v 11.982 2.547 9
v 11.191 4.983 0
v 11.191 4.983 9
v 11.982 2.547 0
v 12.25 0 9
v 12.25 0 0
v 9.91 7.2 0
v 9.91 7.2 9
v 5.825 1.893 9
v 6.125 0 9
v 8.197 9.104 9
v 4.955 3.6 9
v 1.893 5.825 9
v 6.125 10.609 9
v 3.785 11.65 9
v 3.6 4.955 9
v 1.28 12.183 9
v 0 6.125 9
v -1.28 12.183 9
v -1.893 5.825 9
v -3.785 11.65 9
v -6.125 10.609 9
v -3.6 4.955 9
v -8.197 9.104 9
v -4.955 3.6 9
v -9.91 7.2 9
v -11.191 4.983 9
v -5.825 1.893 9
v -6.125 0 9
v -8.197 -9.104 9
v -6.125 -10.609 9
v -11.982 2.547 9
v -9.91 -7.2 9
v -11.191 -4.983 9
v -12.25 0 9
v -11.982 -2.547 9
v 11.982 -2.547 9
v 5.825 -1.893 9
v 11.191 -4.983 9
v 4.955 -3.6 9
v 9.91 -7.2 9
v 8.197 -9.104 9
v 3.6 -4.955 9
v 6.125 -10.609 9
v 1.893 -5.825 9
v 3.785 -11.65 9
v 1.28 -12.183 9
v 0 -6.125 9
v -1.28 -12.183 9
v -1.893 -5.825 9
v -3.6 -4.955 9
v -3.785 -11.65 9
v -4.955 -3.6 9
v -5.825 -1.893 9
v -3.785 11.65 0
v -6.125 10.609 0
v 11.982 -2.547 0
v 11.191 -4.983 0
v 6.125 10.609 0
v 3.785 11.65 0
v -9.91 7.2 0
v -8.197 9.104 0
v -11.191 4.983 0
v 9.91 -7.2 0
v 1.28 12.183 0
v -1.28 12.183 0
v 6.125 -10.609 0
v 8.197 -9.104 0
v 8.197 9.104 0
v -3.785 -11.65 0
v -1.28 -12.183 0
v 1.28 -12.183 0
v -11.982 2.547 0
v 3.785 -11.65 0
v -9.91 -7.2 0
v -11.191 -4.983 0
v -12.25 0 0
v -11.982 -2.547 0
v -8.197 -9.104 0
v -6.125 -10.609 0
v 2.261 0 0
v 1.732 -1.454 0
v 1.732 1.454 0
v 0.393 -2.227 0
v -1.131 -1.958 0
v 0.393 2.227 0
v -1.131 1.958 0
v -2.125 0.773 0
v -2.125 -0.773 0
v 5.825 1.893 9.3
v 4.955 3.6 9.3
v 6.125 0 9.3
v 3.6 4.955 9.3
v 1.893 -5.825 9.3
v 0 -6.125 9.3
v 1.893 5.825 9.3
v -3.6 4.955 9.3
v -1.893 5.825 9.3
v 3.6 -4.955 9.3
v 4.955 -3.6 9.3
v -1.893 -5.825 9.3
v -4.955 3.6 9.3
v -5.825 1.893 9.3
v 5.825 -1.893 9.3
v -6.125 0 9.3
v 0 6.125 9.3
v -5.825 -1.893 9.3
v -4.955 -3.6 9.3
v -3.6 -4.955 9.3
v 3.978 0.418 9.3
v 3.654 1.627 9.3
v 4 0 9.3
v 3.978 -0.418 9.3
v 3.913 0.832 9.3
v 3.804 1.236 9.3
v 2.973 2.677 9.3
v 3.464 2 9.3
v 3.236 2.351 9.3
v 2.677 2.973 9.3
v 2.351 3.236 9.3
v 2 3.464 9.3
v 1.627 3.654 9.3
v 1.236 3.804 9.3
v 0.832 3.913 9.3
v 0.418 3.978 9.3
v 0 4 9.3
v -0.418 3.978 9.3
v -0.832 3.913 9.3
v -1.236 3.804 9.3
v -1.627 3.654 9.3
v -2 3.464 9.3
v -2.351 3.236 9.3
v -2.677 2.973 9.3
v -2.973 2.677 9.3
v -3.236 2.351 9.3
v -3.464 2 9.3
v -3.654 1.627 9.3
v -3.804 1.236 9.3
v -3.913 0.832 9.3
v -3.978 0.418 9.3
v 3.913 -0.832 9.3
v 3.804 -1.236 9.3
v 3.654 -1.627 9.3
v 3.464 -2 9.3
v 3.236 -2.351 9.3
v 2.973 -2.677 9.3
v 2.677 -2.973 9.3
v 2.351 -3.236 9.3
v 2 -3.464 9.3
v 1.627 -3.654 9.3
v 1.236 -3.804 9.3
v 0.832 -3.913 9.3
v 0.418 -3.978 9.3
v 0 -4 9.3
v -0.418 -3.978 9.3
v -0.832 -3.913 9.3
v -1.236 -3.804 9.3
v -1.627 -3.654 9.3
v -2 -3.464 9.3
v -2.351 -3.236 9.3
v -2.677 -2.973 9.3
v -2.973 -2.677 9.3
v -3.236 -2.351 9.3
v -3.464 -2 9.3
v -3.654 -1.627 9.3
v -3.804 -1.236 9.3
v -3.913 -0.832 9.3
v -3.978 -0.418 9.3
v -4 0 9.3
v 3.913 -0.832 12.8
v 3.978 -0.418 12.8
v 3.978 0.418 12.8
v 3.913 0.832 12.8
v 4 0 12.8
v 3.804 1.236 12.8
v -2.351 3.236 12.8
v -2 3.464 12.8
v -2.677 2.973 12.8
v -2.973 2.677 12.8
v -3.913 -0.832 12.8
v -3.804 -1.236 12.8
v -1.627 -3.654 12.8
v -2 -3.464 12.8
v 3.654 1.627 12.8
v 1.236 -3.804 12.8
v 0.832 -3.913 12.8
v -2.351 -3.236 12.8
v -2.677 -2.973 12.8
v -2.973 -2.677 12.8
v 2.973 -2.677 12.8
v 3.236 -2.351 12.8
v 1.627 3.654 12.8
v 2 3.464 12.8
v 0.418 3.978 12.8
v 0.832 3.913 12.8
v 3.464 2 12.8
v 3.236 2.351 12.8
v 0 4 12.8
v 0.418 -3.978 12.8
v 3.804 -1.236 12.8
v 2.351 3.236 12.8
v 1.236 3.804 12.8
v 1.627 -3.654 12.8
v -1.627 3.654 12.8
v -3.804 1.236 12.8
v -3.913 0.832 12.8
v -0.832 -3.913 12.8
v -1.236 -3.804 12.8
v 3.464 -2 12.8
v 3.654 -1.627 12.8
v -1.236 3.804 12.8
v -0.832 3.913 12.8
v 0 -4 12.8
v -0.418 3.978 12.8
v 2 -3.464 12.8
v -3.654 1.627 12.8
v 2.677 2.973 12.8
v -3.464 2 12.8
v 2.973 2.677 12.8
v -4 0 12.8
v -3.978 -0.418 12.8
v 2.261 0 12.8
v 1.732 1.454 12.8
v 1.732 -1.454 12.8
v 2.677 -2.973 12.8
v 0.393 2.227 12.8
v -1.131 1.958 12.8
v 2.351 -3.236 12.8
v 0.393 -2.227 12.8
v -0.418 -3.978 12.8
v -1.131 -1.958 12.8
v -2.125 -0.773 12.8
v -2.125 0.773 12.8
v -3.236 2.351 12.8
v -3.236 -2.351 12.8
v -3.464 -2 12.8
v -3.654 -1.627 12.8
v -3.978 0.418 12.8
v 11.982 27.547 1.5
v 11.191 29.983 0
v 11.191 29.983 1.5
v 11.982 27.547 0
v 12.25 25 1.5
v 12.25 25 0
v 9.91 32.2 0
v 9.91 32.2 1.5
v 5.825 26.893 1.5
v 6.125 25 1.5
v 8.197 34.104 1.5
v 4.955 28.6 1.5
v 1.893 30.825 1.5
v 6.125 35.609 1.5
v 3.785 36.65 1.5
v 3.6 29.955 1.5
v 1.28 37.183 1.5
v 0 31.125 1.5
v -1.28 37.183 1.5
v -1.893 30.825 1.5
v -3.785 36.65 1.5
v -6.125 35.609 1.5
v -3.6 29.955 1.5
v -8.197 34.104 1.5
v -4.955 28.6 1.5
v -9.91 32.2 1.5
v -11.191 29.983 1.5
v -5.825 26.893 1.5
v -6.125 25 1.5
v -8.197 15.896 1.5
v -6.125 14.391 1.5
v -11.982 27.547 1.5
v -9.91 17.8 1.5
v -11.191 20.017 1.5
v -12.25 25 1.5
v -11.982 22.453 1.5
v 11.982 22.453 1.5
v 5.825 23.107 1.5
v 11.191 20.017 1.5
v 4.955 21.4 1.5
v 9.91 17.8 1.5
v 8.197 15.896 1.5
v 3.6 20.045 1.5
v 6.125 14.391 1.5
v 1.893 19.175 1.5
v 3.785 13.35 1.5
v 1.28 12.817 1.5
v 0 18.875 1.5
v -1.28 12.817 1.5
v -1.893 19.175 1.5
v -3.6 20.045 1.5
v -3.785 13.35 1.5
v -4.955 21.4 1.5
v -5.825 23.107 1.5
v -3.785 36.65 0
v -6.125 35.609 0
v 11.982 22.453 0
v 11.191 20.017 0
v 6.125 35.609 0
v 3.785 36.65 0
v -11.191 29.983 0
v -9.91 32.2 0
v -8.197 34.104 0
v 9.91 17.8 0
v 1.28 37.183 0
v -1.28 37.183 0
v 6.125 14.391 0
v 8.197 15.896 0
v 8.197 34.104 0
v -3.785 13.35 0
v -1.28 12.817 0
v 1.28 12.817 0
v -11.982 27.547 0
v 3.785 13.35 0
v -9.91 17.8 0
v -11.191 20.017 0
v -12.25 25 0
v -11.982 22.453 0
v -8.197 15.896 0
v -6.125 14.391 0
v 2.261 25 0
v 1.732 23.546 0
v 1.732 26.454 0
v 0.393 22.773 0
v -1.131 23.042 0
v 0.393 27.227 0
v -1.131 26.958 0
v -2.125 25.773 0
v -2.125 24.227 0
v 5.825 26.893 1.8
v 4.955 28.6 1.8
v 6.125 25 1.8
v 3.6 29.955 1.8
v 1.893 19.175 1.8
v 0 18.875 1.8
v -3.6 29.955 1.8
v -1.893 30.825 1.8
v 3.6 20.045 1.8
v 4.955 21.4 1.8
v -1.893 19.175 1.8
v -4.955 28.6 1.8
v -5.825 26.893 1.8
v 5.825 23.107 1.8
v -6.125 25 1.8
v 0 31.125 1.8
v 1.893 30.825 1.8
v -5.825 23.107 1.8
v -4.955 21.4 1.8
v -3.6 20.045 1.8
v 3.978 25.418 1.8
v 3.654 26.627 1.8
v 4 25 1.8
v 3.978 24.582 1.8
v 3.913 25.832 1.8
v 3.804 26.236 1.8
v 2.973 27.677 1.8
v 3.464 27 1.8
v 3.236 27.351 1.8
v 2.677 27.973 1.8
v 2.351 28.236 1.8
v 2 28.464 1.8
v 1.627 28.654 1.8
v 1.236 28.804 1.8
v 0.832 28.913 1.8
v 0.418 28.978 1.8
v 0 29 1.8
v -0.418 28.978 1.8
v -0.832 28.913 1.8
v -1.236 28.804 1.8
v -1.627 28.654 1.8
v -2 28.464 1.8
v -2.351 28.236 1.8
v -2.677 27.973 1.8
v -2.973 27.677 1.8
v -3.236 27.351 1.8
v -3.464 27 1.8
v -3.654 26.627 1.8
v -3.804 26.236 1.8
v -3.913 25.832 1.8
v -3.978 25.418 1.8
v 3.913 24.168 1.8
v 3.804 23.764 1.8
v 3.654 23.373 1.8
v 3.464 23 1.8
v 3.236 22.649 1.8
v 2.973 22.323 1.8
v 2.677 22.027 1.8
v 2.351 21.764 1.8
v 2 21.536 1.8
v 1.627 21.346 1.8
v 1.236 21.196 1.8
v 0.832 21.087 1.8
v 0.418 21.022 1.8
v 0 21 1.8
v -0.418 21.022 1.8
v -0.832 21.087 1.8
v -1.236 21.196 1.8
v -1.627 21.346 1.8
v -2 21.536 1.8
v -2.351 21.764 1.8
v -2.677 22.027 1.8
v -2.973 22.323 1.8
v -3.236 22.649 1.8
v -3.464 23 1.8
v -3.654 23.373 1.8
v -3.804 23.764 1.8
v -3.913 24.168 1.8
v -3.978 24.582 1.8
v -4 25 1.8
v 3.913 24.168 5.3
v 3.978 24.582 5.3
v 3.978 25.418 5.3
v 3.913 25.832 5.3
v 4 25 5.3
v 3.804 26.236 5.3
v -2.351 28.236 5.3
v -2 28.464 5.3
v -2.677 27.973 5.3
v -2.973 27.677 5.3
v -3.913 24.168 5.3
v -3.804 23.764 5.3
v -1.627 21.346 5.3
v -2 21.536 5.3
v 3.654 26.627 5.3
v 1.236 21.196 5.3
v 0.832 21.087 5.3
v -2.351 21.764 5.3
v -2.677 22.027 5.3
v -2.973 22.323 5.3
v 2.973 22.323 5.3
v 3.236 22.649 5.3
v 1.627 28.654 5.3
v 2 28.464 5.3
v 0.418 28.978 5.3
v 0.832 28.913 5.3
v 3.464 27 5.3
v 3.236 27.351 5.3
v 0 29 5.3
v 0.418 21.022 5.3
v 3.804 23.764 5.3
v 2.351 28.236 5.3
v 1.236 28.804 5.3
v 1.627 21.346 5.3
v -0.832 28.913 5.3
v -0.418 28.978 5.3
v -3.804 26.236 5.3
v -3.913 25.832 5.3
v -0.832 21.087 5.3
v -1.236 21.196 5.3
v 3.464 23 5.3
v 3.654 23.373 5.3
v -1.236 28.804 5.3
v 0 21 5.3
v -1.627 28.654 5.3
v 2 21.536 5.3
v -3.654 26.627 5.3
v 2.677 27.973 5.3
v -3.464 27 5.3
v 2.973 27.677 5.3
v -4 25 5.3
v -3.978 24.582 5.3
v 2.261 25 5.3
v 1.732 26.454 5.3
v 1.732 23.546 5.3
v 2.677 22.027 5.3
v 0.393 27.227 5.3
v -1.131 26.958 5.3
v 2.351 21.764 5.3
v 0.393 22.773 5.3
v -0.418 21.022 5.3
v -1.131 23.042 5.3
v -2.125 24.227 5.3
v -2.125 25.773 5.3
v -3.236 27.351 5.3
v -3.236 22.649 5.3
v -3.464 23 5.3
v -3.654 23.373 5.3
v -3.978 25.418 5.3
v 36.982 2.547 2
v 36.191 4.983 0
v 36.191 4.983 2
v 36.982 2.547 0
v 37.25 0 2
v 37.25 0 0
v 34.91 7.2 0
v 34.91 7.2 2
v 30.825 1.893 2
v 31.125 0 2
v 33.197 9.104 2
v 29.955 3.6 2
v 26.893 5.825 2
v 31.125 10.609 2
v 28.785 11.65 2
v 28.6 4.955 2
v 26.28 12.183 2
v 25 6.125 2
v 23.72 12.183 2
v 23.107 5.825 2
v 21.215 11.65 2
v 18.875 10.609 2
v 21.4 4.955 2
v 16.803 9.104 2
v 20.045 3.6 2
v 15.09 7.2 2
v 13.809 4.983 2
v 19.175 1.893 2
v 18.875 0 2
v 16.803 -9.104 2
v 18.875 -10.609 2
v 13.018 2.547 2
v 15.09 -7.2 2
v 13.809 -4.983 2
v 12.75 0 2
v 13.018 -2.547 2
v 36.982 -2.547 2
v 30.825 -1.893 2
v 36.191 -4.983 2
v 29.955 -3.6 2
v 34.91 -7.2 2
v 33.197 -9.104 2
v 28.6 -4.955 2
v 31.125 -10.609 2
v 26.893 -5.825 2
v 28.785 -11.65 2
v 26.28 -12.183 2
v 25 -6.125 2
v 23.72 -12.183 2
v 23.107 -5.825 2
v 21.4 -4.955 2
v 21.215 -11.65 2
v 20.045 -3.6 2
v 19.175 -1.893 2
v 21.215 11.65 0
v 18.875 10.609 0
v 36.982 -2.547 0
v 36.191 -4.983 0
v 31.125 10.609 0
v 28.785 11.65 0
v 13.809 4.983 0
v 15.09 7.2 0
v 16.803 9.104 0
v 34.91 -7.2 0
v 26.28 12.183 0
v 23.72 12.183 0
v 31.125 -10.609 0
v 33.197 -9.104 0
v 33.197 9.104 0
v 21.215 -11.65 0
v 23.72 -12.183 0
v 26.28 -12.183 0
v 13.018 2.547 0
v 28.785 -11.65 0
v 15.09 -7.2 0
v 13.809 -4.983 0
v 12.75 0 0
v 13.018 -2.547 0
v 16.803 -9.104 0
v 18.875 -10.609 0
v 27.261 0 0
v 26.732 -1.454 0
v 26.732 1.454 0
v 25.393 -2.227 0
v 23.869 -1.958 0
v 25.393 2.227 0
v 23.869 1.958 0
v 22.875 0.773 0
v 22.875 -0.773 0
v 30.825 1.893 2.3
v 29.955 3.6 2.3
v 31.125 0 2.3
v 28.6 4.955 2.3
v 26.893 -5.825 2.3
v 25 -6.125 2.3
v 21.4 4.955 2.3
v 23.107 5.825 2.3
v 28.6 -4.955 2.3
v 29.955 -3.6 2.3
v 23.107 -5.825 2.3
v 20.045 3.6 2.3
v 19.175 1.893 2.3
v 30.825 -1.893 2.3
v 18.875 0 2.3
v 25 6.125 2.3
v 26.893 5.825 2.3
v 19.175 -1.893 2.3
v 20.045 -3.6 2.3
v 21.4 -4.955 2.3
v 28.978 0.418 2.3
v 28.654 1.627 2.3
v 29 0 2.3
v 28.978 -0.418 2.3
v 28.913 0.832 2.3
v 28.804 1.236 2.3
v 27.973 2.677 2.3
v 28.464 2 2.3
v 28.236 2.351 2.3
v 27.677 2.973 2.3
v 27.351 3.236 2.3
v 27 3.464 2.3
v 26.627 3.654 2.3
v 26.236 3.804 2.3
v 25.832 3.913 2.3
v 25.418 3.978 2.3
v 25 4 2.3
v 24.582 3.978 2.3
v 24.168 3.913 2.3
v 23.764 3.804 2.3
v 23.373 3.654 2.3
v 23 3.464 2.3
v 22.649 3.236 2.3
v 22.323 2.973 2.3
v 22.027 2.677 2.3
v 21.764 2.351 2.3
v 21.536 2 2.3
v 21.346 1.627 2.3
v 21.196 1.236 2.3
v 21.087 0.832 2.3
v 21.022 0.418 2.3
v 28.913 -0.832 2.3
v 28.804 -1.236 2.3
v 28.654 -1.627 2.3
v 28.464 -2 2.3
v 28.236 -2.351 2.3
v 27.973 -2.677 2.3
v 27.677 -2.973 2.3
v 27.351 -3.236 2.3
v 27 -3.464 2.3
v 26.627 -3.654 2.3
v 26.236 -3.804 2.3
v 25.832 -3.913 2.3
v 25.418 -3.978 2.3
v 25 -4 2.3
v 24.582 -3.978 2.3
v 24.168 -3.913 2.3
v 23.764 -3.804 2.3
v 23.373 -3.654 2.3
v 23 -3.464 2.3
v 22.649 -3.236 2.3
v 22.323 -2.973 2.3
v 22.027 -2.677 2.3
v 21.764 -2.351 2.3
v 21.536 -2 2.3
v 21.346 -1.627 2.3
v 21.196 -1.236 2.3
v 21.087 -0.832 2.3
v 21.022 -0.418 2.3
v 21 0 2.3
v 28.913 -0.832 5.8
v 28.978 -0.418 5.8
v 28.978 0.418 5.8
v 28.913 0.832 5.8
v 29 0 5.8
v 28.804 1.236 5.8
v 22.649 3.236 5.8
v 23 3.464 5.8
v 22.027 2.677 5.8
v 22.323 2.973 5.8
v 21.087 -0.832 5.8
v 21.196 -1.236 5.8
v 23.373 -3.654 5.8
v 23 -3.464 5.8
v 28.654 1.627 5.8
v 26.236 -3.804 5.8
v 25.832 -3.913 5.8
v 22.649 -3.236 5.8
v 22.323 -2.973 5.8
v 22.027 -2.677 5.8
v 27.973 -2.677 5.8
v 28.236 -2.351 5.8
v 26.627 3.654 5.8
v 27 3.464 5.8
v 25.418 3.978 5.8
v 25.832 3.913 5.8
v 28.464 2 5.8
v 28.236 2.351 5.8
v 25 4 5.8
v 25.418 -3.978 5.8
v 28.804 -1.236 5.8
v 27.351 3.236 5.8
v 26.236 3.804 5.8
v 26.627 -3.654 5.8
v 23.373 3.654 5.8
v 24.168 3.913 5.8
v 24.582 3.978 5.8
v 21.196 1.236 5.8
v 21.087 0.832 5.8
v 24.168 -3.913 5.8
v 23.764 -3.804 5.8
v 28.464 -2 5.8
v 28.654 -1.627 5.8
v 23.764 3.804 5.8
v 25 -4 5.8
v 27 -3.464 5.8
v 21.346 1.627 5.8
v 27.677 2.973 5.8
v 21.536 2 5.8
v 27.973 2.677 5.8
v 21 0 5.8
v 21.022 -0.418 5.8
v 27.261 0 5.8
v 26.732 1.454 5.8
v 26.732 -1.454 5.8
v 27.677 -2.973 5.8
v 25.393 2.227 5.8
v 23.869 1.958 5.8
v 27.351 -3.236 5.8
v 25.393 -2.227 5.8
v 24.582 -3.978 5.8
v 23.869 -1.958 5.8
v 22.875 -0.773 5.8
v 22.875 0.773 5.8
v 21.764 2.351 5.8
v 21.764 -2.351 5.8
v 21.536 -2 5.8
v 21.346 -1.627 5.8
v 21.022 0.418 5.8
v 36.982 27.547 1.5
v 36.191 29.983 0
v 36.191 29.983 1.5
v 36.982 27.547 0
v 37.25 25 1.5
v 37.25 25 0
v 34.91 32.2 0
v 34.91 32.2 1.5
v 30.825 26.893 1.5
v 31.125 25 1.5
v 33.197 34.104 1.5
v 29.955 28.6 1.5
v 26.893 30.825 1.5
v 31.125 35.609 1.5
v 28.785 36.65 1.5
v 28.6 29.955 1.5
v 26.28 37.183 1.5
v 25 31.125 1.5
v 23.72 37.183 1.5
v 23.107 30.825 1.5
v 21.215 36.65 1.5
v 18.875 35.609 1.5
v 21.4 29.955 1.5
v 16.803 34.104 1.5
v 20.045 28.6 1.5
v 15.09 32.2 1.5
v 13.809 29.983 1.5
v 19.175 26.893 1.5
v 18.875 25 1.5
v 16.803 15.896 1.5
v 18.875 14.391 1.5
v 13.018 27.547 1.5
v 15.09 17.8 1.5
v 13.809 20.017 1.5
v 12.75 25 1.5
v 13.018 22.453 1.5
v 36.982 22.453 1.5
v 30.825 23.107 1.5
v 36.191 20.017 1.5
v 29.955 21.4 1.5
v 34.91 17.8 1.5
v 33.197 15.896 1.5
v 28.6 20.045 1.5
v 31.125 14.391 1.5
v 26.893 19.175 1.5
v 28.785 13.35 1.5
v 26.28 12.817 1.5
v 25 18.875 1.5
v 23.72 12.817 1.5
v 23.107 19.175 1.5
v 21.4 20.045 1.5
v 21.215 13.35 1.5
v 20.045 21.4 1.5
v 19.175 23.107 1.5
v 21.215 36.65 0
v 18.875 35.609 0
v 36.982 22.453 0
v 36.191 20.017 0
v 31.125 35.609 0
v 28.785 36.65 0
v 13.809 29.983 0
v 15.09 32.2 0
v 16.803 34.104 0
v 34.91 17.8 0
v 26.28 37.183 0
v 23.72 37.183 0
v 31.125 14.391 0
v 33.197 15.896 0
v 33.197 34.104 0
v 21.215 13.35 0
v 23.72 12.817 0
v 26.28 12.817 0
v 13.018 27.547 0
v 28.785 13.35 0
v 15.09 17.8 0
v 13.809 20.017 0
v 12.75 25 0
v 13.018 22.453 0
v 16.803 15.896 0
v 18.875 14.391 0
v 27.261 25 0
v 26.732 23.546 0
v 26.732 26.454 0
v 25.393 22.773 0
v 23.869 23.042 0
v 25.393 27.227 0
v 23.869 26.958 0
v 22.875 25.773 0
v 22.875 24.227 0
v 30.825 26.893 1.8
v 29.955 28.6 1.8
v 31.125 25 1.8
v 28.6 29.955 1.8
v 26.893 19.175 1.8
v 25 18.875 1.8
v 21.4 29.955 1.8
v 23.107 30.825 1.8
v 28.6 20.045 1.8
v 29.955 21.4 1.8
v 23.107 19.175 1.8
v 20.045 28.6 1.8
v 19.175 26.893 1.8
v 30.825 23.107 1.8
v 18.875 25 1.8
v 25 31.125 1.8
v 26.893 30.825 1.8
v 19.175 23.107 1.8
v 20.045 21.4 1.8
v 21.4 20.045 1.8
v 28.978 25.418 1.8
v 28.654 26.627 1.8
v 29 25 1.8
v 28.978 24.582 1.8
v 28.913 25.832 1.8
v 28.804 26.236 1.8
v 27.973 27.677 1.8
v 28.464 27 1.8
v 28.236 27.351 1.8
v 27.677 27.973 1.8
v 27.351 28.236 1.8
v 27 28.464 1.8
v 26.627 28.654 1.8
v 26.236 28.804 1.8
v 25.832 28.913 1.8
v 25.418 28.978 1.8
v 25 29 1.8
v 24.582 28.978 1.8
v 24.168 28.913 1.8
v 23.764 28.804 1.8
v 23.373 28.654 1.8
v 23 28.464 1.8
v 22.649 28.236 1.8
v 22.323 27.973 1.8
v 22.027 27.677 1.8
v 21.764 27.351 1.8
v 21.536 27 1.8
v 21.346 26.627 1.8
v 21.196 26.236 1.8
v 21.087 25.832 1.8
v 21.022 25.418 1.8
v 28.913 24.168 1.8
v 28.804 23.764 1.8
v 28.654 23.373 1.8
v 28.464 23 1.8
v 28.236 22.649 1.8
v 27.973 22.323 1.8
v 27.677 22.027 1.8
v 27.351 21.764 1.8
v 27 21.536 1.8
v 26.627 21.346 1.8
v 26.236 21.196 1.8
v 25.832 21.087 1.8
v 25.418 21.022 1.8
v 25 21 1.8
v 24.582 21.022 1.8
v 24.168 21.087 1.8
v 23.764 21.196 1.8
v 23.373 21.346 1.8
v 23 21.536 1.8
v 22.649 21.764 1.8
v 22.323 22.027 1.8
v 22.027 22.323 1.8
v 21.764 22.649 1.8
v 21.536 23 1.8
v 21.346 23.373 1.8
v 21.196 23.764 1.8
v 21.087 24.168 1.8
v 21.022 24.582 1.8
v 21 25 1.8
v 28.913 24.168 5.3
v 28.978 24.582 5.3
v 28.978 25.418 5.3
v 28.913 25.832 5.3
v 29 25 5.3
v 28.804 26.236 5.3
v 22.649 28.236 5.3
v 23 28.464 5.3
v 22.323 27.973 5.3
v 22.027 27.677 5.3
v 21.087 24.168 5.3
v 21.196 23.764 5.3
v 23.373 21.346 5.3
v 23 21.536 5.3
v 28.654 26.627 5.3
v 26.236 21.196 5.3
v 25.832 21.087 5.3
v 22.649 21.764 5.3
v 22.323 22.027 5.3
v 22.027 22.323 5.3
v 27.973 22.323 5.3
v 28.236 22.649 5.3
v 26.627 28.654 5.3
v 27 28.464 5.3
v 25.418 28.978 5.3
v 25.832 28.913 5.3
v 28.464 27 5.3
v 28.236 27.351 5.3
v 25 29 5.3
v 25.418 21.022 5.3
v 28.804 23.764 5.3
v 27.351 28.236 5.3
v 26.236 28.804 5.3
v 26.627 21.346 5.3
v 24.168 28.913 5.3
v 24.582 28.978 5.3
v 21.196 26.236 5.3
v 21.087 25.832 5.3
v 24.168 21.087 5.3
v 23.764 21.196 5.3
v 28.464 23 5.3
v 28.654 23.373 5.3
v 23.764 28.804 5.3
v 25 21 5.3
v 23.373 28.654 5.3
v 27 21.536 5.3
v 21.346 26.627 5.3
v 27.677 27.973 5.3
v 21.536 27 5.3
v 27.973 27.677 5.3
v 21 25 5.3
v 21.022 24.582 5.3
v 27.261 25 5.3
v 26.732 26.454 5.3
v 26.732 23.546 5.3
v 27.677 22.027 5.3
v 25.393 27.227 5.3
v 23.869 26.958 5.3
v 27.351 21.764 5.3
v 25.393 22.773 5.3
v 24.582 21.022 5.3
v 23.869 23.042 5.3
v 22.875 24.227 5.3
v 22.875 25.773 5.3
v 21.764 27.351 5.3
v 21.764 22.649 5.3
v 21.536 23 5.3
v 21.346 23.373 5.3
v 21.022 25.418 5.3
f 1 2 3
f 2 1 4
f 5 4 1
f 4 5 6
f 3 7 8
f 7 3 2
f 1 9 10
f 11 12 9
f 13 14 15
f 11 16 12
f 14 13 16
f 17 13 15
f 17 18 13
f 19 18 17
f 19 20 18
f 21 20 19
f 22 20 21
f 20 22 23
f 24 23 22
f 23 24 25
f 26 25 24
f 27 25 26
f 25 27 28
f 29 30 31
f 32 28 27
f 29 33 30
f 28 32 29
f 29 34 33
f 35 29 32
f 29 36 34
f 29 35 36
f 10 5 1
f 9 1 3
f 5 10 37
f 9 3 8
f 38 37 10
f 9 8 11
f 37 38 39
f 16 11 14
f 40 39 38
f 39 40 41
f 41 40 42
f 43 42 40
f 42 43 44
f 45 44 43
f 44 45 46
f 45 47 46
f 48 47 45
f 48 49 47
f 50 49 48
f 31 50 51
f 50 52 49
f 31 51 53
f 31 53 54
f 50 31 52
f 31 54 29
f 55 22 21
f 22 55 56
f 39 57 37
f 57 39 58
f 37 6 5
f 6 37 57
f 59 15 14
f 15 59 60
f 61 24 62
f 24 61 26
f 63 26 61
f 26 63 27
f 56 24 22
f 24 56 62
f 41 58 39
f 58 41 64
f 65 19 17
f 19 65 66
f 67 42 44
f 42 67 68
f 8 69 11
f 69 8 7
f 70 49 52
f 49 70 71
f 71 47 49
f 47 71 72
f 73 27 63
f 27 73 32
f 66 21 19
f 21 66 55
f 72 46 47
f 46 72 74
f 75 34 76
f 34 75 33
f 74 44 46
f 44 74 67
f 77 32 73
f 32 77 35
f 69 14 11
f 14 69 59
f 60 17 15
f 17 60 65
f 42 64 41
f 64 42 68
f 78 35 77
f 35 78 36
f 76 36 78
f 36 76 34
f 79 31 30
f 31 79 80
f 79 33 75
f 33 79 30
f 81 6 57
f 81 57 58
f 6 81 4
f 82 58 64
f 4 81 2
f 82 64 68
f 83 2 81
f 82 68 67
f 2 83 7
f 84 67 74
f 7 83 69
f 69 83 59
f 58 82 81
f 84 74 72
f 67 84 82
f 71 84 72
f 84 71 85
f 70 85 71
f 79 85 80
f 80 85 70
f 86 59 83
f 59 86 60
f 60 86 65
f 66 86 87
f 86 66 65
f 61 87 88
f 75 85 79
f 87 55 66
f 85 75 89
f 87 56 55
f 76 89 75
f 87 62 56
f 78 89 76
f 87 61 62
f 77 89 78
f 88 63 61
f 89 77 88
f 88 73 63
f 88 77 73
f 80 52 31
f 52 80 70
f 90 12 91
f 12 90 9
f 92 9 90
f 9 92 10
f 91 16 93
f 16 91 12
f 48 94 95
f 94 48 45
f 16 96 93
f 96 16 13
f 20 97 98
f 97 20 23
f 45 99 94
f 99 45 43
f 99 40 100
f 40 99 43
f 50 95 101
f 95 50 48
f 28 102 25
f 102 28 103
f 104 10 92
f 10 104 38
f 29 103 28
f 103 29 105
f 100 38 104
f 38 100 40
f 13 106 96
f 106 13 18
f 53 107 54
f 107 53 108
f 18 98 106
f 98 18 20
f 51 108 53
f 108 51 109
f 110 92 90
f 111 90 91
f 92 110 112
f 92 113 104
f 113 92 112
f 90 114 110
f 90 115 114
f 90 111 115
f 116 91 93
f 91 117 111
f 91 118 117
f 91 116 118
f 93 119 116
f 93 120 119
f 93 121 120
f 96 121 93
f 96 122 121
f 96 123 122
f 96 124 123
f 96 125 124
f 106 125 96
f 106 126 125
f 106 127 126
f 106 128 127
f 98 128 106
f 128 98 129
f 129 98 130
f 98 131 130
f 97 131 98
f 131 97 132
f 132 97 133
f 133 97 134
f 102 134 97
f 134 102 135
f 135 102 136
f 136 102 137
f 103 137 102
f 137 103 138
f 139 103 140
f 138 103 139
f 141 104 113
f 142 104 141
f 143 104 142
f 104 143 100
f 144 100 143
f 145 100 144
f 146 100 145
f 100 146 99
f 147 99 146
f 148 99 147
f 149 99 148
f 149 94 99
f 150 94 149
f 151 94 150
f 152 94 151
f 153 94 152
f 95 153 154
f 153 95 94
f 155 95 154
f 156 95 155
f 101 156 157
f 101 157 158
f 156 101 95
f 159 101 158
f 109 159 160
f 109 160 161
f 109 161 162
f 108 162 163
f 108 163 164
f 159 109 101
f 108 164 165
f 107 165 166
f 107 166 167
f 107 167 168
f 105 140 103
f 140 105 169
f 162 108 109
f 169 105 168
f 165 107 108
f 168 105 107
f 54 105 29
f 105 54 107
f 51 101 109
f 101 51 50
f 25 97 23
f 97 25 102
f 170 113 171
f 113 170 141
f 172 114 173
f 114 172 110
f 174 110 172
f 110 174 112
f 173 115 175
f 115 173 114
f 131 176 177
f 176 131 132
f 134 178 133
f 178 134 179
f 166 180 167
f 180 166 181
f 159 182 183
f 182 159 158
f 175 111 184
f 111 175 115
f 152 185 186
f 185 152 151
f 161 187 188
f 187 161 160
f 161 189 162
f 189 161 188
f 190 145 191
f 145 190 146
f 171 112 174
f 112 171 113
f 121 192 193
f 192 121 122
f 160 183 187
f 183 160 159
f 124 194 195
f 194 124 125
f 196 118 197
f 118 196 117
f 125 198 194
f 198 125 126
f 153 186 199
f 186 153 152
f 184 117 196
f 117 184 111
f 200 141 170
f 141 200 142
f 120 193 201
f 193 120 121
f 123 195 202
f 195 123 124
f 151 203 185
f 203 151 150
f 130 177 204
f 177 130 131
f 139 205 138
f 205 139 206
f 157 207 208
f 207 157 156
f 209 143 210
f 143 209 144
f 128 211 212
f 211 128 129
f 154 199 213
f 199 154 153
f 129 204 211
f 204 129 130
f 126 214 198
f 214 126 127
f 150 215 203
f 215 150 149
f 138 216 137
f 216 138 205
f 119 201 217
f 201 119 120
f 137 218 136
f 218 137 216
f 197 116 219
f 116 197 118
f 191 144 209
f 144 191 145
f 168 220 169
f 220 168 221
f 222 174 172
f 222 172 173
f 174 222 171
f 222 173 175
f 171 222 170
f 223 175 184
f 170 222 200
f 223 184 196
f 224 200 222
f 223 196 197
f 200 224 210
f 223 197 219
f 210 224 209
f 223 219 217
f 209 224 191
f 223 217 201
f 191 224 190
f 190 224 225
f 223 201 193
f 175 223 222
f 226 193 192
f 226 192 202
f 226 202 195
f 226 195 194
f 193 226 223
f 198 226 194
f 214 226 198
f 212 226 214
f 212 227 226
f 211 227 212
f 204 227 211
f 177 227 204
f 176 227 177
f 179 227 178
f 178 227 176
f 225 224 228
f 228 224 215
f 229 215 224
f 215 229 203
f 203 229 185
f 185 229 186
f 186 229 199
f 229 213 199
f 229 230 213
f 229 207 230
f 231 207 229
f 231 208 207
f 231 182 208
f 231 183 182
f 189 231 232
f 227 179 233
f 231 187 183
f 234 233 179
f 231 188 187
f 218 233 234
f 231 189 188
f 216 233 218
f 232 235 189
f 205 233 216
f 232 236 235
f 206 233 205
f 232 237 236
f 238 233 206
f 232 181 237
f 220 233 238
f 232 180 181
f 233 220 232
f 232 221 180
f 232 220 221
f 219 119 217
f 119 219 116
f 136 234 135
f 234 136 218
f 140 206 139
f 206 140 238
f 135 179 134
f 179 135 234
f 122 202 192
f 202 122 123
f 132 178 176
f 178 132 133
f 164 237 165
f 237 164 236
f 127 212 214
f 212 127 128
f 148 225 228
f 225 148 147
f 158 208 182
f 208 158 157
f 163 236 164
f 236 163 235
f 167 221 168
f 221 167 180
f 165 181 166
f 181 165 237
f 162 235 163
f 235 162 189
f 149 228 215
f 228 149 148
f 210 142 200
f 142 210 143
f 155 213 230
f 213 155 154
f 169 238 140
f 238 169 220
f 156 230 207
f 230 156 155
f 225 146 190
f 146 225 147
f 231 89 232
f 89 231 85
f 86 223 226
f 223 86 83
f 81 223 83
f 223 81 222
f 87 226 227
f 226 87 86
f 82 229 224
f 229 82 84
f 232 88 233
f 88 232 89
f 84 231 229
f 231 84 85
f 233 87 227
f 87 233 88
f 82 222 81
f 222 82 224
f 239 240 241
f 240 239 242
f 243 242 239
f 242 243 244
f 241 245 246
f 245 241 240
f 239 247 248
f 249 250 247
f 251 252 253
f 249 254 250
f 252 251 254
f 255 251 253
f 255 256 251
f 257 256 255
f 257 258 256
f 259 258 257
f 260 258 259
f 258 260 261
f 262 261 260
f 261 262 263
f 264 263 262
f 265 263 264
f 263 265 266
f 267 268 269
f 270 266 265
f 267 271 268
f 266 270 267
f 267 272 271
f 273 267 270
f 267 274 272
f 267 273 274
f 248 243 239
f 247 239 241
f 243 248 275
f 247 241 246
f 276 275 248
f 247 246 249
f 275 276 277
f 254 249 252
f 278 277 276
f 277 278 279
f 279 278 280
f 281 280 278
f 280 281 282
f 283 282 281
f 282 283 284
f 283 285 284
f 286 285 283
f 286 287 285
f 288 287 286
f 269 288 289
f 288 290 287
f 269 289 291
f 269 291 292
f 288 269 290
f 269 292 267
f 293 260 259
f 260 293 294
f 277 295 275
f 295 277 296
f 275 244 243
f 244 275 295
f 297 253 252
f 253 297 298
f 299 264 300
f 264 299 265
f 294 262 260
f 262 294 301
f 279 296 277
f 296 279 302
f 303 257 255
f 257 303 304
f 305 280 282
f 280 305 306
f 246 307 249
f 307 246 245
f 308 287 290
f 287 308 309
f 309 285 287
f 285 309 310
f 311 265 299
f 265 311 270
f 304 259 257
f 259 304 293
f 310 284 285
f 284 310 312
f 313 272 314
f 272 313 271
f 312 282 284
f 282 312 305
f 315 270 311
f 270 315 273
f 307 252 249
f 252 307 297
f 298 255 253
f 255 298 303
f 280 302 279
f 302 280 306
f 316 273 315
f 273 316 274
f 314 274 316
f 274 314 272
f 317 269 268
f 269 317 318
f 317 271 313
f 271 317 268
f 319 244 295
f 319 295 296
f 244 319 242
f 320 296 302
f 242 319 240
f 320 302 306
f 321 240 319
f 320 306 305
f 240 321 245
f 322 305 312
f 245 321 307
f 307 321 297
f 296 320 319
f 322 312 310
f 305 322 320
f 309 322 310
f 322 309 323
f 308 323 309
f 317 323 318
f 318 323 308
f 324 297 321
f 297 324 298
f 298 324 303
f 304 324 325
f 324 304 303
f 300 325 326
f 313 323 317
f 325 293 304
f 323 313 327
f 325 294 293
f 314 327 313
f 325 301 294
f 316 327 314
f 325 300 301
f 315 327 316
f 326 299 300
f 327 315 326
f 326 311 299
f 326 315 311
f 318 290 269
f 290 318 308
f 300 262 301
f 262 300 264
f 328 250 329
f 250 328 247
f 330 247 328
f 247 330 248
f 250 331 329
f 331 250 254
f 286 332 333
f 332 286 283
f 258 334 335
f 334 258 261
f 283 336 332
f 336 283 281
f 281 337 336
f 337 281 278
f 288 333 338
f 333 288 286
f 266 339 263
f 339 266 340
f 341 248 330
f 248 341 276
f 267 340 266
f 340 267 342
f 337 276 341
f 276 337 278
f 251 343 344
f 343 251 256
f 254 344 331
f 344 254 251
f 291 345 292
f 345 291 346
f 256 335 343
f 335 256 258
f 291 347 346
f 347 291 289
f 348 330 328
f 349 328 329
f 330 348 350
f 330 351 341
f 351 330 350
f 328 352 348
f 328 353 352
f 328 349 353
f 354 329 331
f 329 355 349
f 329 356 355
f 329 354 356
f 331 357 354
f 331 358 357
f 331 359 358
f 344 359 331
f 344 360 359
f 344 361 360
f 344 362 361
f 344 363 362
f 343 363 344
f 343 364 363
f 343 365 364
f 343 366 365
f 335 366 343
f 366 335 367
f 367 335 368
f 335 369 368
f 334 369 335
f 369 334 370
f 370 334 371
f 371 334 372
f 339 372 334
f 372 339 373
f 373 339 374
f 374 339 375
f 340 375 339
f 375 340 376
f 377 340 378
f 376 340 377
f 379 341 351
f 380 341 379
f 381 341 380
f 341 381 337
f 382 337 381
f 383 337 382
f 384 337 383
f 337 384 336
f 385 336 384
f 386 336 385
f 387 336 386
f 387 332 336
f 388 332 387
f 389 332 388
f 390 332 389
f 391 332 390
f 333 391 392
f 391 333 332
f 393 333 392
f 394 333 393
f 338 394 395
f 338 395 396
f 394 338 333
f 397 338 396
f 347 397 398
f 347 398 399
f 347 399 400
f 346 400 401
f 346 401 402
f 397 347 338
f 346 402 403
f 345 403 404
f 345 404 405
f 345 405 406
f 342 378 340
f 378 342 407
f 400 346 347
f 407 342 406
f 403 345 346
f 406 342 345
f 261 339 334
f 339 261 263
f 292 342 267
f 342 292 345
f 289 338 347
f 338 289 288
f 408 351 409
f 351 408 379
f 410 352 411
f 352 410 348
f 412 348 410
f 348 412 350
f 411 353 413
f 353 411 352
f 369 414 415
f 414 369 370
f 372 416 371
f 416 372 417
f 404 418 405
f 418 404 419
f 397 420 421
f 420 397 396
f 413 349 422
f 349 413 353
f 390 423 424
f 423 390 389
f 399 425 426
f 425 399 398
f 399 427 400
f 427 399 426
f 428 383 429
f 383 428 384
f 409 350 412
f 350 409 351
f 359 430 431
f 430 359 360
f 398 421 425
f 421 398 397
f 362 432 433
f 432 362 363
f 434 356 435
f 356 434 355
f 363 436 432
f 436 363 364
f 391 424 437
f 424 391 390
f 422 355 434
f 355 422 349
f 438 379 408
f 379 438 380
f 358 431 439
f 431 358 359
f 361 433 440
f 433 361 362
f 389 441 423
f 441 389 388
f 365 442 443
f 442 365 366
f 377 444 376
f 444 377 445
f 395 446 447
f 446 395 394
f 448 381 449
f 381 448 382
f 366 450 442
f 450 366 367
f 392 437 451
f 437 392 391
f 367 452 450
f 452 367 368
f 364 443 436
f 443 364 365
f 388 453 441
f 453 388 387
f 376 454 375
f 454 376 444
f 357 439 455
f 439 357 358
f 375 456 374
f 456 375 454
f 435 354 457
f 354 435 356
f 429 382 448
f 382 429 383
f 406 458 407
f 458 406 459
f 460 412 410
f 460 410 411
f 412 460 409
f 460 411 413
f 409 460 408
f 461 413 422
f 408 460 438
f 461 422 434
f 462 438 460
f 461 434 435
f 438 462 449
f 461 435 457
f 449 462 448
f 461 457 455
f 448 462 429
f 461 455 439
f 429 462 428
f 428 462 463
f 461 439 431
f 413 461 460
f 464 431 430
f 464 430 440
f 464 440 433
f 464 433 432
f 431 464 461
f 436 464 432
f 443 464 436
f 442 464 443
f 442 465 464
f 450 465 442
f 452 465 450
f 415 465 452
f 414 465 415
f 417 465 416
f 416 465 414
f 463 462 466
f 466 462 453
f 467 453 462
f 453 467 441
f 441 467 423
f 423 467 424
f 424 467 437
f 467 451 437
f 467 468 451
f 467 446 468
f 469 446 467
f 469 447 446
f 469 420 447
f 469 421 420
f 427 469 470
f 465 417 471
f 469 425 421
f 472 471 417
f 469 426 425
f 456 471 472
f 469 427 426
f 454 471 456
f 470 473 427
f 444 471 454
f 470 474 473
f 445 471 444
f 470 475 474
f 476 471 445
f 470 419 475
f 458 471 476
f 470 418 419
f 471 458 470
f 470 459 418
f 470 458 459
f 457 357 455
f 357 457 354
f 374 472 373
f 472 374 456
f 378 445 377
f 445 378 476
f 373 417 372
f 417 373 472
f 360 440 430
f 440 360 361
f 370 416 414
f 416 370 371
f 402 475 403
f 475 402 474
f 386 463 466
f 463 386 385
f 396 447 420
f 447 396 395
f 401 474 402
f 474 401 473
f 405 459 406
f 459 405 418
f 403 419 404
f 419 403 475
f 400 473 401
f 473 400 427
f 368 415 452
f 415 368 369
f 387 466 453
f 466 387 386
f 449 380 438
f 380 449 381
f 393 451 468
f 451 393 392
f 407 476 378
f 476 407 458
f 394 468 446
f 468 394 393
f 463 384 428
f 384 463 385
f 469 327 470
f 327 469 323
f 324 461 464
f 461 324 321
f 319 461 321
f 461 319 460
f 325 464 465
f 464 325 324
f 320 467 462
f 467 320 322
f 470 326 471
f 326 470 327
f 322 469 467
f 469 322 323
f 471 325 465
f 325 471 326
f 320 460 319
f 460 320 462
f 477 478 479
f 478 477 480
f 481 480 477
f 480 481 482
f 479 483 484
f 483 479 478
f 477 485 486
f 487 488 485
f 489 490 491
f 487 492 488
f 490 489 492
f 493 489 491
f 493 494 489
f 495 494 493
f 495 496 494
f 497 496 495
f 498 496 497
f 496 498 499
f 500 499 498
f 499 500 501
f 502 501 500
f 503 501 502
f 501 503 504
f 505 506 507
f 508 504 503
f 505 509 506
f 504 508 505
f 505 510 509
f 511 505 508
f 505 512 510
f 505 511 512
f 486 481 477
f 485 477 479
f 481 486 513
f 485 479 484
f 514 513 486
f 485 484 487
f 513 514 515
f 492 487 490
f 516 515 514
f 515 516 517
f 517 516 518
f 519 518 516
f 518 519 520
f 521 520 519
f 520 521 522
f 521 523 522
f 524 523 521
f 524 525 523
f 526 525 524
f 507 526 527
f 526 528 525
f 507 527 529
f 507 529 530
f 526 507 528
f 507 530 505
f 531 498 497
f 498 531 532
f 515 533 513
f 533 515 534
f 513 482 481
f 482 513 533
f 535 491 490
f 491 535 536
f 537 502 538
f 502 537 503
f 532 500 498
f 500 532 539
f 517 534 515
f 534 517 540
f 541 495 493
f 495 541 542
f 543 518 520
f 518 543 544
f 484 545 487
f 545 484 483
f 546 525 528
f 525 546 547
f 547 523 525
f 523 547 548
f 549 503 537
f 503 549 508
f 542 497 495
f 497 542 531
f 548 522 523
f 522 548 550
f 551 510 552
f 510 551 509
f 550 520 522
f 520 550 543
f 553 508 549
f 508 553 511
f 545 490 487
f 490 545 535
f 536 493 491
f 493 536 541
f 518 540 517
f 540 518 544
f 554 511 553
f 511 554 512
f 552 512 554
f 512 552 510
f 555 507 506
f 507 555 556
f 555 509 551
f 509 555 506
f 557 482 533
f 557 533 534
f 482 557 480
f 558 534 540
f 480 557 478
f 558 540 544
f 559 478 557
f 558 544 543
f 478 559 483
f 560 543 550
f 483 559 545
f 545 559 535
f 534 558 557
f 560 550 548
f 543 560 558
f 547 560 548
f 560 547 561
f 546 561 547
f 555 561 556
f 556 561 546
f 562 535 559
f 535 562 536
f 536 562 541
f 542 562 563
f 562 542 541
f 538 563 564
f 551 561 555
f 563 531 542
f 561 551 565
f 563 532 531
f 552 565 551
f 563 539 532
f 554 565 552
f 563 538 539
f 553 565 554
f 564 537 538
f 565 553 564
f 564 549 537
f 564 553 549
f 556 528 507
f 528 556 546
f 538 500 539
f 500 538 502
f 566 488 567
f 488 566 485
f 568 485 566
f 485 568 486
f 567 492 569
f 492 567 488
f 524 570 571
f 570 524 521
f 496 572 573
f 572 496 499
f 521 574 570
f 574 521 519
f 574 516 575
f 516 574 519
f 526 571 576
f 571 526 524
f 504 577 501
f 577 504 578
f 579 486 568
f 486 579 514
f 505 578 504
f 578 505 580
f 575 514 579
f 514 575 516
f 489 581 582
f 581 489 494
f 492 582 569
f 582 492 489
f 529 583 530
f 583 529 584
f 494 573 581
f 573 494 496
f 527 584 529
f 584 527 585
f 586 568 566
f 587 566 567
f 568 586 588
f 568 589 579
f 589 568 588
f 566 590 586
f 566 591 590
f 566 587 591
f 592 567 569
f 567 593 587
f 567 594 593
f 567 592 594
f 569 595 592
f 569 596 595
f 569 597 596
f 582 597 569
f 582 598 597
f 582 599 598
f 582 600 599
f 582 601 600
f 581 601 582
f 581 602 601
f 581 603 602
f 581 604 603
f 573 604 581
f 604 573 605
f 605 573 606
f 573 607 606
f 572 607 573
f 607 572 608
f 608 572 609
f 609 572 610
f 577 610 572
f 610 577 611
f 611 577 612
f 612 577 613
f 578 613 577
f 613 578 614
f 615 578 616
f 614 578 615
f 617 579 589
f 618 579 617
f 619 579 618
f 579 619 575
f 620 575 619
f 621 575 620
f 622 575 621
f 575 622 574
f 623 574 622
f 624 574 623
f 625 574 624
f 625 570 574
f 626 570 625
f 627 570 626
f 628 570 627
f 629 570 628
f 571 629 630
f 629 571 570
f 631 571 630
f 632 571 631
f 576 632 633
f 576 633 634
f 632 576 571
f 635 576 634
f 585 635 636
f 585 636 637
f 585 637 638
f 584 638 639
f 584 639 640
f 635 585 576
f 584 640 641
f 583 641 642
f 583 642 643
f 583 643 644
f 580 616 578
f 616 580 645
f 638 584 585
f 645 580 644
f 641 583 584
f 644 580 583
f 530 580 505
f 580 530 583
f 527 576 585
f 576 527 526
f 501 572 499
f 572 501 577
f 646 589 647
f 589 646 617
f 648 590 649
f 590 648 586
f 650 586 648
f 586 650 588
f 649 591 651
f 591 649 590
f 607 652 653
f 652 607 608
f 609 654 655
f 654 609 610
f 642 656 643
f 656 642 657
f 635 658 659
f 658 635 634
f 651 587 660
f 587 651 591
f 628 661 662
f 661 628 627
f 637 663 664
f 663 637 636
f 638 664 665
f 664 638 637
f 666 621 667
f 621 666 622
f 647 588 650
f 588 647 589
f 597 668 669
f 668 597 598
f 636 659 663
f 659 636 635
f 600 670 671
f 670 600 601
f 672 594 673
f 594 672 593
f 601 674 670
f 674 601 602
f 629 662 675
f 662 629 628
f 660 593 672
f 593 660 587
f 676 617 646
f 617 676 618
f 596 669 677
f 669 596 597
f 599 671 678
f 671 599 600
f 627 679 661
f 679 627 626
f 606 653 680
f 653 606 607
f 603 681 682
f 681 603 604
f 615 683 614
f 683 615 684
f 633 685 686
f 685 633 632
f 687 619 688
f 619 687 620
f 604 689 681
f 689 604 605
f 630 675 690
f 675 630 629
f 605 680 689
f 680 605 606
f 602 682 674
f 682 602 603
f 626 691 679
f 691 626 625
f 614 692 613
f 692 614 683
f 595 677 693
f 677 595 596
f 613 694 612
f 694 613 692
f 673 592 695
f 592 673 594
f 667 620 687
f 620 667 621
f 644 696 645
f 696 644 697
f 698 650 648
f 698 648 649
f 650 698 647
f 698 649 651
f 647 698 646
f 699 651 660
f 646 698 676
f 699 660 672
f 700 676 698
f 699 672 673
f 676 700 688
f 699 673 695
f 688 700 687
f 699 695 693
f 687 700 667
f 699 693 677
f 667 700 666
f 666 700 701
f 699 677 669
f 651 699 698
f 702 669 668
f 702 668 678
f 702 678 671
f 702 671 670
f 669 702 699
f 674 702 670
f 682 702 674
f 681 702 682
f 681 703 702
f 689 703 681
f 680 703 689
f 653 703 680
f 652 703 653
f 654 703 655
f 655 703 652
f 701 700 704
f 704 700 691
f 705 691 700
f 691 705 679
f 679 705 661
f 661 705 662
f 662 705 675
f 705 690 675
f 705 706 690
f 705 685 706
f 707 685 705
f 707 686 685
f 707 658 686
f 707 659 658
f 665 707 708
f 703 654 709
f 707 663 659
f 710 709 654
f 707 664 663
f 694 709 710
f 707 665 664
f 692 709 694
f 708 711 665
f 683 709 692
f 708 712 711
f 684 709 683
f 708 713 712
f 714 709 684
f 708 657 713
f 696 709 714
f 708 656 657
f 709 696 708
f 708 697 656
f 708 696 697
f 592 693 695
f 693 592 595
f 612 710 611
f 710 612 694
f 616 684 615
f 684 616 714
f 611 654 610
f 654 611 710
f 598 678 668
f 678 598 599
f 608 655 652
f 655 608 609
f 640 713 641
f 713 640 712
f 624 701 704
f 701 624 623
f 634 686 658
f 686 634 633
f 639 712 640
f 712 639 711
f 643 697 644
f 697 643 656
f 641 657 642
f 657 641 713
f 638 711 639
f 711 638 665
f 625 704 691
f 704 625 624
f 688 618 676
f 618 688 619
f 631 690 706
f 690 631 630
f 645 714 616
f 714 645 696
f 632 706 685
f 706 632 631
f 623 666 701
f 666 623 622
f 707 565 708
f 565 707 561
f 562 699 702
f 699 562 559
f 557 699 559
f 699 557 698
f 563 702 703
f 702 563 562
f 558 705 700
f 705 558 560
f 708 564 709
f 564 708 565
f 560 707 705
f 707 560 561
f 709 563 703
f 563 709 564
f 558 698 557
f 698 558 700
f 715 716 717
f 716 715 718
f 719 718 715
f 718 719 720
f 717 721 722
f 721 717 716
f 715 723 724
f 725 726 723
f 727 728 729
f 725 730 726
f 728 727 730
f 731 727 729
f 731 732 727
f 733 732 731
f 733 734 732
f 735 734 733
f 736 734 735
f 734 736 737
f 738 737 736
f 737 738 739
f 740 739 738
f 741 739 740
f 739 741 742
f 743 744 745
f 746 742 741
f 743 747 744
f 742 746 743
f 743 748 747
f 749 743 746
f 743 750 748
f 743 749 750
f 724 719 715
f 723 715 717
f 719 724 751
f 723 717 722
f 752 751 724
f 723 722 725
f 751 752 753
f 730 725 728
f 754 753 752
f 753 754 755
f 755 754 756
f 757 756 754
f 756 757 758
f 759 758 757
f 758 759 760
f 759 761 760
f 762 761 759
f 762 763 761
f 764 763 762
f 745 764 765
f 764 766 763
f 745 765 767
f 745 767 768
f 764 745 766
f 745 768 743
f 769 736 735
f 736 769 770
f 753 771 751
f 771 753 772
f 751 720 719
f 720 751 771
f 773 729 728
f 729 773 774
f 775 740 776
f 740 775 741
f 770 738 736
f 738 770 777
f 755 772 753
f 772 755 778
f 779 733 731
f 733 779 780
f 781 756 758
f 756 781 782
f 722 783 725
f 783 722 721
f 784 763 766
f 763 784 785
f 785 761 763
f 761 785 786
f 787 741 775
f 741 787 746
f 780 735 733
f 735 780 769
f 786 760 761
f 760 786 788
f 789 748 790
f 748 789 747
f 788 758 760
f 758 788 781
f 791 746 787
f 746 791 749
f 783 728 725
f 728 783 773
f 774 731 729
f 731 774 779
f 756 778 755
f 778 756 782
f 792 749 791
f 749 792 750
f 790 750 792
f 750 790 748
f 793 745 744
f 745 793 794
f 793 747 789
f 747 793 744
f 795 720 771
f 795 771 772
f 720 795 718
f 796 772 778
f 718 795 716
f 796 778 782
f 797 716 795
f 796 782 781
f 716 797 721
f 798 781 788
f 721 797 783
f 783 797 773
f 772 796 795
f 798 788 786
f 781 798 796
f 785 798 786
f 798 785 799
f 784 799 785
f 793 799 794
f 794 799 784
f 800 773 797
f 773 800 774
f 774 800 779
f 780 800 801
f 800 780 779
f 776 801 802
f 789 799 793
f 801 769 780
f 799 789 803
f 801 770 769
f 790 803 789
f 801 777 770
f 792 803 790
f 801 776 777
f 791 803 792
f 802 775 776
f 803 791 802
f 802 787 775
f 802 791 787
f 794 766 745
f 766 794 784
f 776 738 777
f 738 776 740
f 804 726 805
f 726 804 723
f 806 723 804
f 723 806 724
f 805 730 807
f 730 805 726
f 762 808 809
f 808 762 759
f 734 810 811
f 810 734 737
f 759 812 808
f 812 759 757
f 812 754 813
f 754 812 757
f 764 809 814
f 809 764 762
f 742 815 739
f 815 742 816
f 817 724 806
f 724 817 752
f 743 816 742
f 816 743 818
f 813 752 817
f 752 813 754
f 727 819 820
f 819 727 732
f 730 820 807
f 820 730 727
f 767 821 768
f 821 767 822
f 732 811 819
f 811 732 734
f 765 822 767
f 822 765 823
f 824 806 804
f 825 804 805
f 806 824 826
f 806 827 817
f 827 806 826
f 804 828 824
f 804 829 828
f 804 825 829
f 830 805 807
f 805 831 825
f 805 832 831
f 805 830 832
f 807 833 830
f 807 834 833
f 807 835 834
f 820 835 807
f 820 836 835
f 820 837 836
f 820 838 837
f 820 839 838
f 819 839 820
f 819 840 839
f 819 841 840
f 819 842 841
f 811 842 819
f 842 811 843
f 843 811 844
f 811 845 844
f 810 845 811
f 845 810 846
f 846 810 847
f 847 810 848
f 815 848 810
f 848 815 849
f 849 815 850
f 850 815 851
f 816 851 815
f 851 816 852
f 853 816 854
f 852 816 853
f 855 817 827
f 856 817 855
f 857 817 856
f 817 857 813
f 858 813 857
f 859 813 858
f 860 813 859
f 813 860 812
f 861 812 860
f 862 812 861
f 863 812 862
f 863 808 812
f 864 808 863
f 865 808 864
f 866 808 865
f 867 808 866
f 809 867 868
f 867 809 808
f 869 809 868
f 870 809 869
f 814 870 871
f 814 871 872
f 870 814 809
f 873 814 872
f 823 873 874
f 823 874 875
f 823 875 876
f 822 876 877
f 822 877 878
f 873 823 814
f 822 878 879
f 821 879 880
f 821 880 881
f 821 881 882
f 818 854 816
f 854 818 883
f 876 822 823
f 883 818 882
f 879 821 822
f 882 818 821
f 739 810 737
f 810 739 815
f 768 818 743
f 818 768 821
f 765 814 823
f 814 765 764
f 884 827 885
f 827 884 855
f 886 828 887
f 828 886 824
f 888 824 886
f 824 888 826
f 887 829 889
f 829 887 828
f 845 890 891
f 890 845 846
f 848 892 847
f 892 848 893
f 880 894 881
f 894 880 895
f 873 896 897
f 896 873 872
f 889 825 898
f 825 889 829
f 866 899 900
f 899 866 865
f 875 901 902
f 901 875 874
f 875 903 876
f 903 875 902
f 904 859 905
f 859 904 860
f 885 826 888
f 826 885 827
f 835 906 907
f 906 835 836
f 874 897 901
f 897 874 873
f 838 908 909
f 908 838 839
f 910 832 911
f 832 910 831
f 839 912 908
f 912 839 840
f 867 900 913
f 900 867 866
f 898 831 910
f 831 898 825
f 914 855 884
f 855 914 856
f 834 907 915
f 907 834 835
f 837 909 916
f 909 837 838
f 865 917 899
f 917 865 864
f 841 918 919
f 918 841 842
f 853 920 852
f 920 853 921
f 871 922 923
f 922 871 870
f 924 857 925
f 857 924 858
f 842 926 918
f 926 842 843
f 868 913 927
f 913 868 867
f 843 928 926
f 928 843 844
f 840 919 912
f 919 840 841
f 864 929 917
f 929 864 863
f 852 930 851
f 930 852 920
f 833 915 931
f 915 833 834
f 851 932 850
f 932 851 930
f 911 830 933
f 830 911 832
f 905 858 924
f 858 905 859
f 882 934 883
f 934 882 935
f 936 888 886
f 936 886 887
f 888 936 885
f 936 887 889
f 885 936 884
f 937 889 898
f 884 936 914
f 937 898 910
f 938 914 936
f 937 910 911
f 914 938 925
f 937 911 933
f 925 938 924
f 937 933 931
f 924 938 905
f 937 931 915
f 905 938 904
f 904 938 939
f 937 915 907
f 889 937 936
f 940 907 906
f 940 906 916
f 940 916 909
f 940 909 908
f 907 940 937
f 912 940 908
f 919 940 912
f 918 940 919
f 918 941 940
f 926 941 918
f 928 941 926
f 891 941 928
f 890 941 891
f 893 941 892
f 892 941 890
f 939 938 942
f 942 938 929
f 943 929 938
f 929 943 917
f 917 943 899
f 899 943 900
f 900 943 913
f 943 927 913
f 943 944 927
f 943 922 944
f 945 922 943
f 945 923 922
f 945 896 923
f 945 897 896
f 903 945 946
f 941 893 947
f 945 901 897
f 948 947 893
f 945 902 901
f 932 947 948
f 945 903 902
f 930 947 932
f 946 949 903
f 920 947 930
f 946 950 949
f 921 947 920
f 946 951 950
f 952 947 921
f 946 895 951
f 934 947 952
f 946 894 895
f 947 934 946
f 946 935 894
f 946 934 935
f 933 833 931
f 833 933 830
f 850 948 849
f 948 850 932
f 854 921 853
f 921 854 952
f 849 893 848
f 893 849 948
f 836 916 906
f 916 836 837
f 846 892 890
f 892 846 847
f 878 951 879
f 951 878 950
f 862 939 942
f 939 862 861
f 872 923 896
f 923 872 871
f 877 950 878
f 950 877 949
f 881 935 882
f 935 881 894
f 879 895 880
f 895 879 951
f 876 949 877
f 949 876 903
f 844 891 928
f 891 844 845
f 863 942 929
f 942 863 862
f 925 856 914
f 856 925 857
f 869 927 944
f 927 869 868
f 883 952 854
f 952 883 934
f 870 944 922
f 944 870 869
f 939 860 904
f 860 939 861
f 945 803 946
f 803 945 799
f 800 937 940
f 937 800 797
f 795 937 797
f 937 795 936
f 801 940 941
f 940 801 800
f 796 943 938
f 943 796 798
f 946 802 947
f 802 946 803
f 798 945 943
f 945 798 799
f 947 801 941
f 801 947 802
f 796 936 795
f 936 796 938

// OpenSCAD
// file: timing_belts.scad
/*Parametric belting section generator 
By - The DoomMeister
Derived from http://www.thingiverse.com/thing:16627 by Droftarts
*/


//Variables
tooth_profile = "MXL"; // "T2.5", "T5" , "T10"
belt_width = 4;
n = 20;

//Draw
/*
belt_length(profile = tooth_profile, belt_width = 10, n = 30);
translate([0,0,-20])color("red")belt_length(profile = "T5", belt_width = 10, n = 15);
translate([0,0,-40])color("green")belt_length(profile = "T10", belt_width = 10, n = 8);
*/

//Outer Module
module belt_length(profile = "T2.5", belt_width = 6, n = 10)
{

			if ( profile == "T2.5" ) 
				{ 
					_belt_length(
						profile=profile, 
						n = n, 
						belt_width = belt_width,
						tooth_pitch = 2.5,
						backing_thickness = 0.6	
						);
				}
			if ( profile == "T5" ) 
				{ 
					_belt_length(
						profile=profile, 
						n = n, 
						belt_width = belt_width,
						tooth_pitch = 5,
						backing_thickness = 1	
						);
				}
			if ( profile == "T10" ) 
				{ 
					_belt_length(
						profile=profile, 
						n = n, 
						belt_width = belt_width,
						tooth_pitch = 10,
						backing_thickness = 2
						);
				}
			if ( profile == "MXL" ) 
				{ 
					_belt_length(
						profile=profile, 
						n = n, 
						belt_width = belt_width,
						tooth_pitch = 2.032,
						backing_thickness = 0.64
						);
				}


}



//inner module
module _belt_length(profile = "T2.5", n = 10, belt_width = 5, tooth_pitch = 2.5, backing_thickness = 0.6)
{

for( i = [0:n])
	{
		union(){

			if ( profile == "T2.5" ) { translate([tooth_pitch*i,0,0])T2_5(width = belt_width);}
			if ( profile == "T5" ) { translate([tooth_pitch*i,0,0])T5(width = belt_width);}
			if ( profile == "T10" ) { translate([tooth_pitch*i,0,0])T10(width = belt_width);}
			if ( profile == "MXL" ) { translate([tooth_pitch*i,0,0])MXL(width = belt_width);}
			translate([(tooth_pitch*i)-(tooth_pitch/2),-backing_thickness,0])cube([tooth_pitch,backing_thickness,belt_width]);
		}
	}
}



//Tooth Form modules - Taken from http://www.thingiverse.com/thing:1662
module T2_5(width = 2)
	{
	linear_extrude(height=width) polygon([[-0.839258,-0.5],[-0.839258,0],[-0.770246,0.021652],[-0.726369,0.079022],[-0.529167,0.620889],[-0.485025,0.67826],[-0.416278,0.699911],[0.416278,0.699911],[0.484849,0.67826],[0.528814,0.620889],[0.726369,0.079022],[0.770114,0.021652],[0.839258,0],[0.839258,-0.5]]);
	}

module T5(width = 2)
	{
	linear_extrude(height=width) polygon([[-1.632126,-0.5],[-1.632126,0],[-1.568549,0.004939],[-1.507539,0.019367],[-1.450023,0.042686],[-1.396912,0.074224],[-1.349125,0.113379],[-1.307581,0.159508],[-1.273186,0.211991],[-1.246868,0.270192],[-1.009802,0.920362],[-0.983414,0.978433],[-0.949018,1.030788],[-0.907524,1.076798],[-0.859829,1.115847],[-0.80682,1.147314],[-0.749402,1.170562],[-0.688471,1.184956],[-0.624921,1.189895],[0.624971,1.189895],[0.688622,1.184956],[0.749607,1.170562],[0.807043,1.147314],[0.860055,1.115847],[0.907754,1.076798],[0.949269,1.030788],[0.9837,0.978433],[1.010193,0.920362],[1.246907,0.270192],[1.273295,0.211991],[1.307726,0.159508],[1.349276,0.113379],[1.397039,0.074224],[1.450111,0.042686],[1.507589,0.019367],[1.568563,0.004939],[1.632126,0],[1.632126,-0.5]]);
	}

module T10(width = 2)
	{
	linear_extrude(height=width) polygon([[-3.06511,-1],[-3.06511,0],[-2.971998,0.007239],[-2.882718,0.028344],[-2.79859,0.062396],[-2.720931,0.108479],[-2.651061,0.165675],[-2.590298,0.233065],[-2.539962,0.309732],[-2.501371,0.394759],[-1.879071,2.105025],[-1.840363,2.190052],[-1.789939,2.266719],[-1.729114,2.334109],[-1.659202,2.391304],[-1.581518,2.437387],[-1.497376,2.47144],[-1.408092,2.492545],[-1.314979,2.499784],[1.314979,2.499784],[1.408091,2.492545],[1.497371,2.47144],[1.581499,2.437387],[1.659158,2.391304],[1.729028,2.334109],[1.789791,2.266719],[1.840127,2.190052],[1.878718,2.105025],[2.501018,0.394759],[2.539726,0.309732],[2.59015,0.233065],[2.650975,0.165675],[2.720887,0.108479],[2.798571,0.062396],[2.882713,0.028344],[2.971997,0.007239],[3.06511,0],[3.06511,-1]]);
	}

module MXL(width = 2)
	{
	linear_extrude(height=width) polygon([[-0.660421,-0.5],[-0.660421,0],[-0.621898,0.006033],[-0.587714,0.023037],[-0.560056,0.049424],[-0.541182,0.083609],[-0.417357,0.424392],[-0.398413,0.458752],[-0.370649,0.48514],[-0.336324,0.502074],[-0.297744,0.508035],[0.297744,0.508035],[0.336268,0.502074],[0.370452,0.48514],[0.39811,0.458752],[0.416983,0.424392],[0.540808,0.083609],[0.559752,0.049424],[0.587516,0.023037],[0.621841,0.006033],[0.660421,0],[0.660421,-0.5]]);
	}
// file: util.scad
module hexagon(size, h, center=false) {
    boxWidth=size/1.75;
    translate ([0, 0, center ? 0 : h/2]) {
        union(){
            cube([boxWidth, size, h], center=true);
            rotate([0,0,60]) cube([boxWidth, size, h], center=true);
            rotate([0,0,-60]) cube([boxWidth, size, h], center=true);
        }
    }
}

module polyhole(d, h, center=false, d1=-1, d2=-1) {
    n = max(round(2 * ((d1<0 || d2<0) ? d : max(d1, d2))),3);
    if (d1<0 || d2<0) {
        cylinder(h = h, r = (d / 2) / cos (180 / n), center=center, $fn = n);
    } else {
        cylinder(h = h, r1 = (d1 / 2) / cos (180 / n), r2 = (d2 / 2) / cos (180 / n), center=center, $fn = n);
    }
}
// main file
include <Kikai Woody.scad>;

!union() {
	608_adapter(border_bottom_h=9);
	translate([25, 0, 0]) 608_adapter();
}
